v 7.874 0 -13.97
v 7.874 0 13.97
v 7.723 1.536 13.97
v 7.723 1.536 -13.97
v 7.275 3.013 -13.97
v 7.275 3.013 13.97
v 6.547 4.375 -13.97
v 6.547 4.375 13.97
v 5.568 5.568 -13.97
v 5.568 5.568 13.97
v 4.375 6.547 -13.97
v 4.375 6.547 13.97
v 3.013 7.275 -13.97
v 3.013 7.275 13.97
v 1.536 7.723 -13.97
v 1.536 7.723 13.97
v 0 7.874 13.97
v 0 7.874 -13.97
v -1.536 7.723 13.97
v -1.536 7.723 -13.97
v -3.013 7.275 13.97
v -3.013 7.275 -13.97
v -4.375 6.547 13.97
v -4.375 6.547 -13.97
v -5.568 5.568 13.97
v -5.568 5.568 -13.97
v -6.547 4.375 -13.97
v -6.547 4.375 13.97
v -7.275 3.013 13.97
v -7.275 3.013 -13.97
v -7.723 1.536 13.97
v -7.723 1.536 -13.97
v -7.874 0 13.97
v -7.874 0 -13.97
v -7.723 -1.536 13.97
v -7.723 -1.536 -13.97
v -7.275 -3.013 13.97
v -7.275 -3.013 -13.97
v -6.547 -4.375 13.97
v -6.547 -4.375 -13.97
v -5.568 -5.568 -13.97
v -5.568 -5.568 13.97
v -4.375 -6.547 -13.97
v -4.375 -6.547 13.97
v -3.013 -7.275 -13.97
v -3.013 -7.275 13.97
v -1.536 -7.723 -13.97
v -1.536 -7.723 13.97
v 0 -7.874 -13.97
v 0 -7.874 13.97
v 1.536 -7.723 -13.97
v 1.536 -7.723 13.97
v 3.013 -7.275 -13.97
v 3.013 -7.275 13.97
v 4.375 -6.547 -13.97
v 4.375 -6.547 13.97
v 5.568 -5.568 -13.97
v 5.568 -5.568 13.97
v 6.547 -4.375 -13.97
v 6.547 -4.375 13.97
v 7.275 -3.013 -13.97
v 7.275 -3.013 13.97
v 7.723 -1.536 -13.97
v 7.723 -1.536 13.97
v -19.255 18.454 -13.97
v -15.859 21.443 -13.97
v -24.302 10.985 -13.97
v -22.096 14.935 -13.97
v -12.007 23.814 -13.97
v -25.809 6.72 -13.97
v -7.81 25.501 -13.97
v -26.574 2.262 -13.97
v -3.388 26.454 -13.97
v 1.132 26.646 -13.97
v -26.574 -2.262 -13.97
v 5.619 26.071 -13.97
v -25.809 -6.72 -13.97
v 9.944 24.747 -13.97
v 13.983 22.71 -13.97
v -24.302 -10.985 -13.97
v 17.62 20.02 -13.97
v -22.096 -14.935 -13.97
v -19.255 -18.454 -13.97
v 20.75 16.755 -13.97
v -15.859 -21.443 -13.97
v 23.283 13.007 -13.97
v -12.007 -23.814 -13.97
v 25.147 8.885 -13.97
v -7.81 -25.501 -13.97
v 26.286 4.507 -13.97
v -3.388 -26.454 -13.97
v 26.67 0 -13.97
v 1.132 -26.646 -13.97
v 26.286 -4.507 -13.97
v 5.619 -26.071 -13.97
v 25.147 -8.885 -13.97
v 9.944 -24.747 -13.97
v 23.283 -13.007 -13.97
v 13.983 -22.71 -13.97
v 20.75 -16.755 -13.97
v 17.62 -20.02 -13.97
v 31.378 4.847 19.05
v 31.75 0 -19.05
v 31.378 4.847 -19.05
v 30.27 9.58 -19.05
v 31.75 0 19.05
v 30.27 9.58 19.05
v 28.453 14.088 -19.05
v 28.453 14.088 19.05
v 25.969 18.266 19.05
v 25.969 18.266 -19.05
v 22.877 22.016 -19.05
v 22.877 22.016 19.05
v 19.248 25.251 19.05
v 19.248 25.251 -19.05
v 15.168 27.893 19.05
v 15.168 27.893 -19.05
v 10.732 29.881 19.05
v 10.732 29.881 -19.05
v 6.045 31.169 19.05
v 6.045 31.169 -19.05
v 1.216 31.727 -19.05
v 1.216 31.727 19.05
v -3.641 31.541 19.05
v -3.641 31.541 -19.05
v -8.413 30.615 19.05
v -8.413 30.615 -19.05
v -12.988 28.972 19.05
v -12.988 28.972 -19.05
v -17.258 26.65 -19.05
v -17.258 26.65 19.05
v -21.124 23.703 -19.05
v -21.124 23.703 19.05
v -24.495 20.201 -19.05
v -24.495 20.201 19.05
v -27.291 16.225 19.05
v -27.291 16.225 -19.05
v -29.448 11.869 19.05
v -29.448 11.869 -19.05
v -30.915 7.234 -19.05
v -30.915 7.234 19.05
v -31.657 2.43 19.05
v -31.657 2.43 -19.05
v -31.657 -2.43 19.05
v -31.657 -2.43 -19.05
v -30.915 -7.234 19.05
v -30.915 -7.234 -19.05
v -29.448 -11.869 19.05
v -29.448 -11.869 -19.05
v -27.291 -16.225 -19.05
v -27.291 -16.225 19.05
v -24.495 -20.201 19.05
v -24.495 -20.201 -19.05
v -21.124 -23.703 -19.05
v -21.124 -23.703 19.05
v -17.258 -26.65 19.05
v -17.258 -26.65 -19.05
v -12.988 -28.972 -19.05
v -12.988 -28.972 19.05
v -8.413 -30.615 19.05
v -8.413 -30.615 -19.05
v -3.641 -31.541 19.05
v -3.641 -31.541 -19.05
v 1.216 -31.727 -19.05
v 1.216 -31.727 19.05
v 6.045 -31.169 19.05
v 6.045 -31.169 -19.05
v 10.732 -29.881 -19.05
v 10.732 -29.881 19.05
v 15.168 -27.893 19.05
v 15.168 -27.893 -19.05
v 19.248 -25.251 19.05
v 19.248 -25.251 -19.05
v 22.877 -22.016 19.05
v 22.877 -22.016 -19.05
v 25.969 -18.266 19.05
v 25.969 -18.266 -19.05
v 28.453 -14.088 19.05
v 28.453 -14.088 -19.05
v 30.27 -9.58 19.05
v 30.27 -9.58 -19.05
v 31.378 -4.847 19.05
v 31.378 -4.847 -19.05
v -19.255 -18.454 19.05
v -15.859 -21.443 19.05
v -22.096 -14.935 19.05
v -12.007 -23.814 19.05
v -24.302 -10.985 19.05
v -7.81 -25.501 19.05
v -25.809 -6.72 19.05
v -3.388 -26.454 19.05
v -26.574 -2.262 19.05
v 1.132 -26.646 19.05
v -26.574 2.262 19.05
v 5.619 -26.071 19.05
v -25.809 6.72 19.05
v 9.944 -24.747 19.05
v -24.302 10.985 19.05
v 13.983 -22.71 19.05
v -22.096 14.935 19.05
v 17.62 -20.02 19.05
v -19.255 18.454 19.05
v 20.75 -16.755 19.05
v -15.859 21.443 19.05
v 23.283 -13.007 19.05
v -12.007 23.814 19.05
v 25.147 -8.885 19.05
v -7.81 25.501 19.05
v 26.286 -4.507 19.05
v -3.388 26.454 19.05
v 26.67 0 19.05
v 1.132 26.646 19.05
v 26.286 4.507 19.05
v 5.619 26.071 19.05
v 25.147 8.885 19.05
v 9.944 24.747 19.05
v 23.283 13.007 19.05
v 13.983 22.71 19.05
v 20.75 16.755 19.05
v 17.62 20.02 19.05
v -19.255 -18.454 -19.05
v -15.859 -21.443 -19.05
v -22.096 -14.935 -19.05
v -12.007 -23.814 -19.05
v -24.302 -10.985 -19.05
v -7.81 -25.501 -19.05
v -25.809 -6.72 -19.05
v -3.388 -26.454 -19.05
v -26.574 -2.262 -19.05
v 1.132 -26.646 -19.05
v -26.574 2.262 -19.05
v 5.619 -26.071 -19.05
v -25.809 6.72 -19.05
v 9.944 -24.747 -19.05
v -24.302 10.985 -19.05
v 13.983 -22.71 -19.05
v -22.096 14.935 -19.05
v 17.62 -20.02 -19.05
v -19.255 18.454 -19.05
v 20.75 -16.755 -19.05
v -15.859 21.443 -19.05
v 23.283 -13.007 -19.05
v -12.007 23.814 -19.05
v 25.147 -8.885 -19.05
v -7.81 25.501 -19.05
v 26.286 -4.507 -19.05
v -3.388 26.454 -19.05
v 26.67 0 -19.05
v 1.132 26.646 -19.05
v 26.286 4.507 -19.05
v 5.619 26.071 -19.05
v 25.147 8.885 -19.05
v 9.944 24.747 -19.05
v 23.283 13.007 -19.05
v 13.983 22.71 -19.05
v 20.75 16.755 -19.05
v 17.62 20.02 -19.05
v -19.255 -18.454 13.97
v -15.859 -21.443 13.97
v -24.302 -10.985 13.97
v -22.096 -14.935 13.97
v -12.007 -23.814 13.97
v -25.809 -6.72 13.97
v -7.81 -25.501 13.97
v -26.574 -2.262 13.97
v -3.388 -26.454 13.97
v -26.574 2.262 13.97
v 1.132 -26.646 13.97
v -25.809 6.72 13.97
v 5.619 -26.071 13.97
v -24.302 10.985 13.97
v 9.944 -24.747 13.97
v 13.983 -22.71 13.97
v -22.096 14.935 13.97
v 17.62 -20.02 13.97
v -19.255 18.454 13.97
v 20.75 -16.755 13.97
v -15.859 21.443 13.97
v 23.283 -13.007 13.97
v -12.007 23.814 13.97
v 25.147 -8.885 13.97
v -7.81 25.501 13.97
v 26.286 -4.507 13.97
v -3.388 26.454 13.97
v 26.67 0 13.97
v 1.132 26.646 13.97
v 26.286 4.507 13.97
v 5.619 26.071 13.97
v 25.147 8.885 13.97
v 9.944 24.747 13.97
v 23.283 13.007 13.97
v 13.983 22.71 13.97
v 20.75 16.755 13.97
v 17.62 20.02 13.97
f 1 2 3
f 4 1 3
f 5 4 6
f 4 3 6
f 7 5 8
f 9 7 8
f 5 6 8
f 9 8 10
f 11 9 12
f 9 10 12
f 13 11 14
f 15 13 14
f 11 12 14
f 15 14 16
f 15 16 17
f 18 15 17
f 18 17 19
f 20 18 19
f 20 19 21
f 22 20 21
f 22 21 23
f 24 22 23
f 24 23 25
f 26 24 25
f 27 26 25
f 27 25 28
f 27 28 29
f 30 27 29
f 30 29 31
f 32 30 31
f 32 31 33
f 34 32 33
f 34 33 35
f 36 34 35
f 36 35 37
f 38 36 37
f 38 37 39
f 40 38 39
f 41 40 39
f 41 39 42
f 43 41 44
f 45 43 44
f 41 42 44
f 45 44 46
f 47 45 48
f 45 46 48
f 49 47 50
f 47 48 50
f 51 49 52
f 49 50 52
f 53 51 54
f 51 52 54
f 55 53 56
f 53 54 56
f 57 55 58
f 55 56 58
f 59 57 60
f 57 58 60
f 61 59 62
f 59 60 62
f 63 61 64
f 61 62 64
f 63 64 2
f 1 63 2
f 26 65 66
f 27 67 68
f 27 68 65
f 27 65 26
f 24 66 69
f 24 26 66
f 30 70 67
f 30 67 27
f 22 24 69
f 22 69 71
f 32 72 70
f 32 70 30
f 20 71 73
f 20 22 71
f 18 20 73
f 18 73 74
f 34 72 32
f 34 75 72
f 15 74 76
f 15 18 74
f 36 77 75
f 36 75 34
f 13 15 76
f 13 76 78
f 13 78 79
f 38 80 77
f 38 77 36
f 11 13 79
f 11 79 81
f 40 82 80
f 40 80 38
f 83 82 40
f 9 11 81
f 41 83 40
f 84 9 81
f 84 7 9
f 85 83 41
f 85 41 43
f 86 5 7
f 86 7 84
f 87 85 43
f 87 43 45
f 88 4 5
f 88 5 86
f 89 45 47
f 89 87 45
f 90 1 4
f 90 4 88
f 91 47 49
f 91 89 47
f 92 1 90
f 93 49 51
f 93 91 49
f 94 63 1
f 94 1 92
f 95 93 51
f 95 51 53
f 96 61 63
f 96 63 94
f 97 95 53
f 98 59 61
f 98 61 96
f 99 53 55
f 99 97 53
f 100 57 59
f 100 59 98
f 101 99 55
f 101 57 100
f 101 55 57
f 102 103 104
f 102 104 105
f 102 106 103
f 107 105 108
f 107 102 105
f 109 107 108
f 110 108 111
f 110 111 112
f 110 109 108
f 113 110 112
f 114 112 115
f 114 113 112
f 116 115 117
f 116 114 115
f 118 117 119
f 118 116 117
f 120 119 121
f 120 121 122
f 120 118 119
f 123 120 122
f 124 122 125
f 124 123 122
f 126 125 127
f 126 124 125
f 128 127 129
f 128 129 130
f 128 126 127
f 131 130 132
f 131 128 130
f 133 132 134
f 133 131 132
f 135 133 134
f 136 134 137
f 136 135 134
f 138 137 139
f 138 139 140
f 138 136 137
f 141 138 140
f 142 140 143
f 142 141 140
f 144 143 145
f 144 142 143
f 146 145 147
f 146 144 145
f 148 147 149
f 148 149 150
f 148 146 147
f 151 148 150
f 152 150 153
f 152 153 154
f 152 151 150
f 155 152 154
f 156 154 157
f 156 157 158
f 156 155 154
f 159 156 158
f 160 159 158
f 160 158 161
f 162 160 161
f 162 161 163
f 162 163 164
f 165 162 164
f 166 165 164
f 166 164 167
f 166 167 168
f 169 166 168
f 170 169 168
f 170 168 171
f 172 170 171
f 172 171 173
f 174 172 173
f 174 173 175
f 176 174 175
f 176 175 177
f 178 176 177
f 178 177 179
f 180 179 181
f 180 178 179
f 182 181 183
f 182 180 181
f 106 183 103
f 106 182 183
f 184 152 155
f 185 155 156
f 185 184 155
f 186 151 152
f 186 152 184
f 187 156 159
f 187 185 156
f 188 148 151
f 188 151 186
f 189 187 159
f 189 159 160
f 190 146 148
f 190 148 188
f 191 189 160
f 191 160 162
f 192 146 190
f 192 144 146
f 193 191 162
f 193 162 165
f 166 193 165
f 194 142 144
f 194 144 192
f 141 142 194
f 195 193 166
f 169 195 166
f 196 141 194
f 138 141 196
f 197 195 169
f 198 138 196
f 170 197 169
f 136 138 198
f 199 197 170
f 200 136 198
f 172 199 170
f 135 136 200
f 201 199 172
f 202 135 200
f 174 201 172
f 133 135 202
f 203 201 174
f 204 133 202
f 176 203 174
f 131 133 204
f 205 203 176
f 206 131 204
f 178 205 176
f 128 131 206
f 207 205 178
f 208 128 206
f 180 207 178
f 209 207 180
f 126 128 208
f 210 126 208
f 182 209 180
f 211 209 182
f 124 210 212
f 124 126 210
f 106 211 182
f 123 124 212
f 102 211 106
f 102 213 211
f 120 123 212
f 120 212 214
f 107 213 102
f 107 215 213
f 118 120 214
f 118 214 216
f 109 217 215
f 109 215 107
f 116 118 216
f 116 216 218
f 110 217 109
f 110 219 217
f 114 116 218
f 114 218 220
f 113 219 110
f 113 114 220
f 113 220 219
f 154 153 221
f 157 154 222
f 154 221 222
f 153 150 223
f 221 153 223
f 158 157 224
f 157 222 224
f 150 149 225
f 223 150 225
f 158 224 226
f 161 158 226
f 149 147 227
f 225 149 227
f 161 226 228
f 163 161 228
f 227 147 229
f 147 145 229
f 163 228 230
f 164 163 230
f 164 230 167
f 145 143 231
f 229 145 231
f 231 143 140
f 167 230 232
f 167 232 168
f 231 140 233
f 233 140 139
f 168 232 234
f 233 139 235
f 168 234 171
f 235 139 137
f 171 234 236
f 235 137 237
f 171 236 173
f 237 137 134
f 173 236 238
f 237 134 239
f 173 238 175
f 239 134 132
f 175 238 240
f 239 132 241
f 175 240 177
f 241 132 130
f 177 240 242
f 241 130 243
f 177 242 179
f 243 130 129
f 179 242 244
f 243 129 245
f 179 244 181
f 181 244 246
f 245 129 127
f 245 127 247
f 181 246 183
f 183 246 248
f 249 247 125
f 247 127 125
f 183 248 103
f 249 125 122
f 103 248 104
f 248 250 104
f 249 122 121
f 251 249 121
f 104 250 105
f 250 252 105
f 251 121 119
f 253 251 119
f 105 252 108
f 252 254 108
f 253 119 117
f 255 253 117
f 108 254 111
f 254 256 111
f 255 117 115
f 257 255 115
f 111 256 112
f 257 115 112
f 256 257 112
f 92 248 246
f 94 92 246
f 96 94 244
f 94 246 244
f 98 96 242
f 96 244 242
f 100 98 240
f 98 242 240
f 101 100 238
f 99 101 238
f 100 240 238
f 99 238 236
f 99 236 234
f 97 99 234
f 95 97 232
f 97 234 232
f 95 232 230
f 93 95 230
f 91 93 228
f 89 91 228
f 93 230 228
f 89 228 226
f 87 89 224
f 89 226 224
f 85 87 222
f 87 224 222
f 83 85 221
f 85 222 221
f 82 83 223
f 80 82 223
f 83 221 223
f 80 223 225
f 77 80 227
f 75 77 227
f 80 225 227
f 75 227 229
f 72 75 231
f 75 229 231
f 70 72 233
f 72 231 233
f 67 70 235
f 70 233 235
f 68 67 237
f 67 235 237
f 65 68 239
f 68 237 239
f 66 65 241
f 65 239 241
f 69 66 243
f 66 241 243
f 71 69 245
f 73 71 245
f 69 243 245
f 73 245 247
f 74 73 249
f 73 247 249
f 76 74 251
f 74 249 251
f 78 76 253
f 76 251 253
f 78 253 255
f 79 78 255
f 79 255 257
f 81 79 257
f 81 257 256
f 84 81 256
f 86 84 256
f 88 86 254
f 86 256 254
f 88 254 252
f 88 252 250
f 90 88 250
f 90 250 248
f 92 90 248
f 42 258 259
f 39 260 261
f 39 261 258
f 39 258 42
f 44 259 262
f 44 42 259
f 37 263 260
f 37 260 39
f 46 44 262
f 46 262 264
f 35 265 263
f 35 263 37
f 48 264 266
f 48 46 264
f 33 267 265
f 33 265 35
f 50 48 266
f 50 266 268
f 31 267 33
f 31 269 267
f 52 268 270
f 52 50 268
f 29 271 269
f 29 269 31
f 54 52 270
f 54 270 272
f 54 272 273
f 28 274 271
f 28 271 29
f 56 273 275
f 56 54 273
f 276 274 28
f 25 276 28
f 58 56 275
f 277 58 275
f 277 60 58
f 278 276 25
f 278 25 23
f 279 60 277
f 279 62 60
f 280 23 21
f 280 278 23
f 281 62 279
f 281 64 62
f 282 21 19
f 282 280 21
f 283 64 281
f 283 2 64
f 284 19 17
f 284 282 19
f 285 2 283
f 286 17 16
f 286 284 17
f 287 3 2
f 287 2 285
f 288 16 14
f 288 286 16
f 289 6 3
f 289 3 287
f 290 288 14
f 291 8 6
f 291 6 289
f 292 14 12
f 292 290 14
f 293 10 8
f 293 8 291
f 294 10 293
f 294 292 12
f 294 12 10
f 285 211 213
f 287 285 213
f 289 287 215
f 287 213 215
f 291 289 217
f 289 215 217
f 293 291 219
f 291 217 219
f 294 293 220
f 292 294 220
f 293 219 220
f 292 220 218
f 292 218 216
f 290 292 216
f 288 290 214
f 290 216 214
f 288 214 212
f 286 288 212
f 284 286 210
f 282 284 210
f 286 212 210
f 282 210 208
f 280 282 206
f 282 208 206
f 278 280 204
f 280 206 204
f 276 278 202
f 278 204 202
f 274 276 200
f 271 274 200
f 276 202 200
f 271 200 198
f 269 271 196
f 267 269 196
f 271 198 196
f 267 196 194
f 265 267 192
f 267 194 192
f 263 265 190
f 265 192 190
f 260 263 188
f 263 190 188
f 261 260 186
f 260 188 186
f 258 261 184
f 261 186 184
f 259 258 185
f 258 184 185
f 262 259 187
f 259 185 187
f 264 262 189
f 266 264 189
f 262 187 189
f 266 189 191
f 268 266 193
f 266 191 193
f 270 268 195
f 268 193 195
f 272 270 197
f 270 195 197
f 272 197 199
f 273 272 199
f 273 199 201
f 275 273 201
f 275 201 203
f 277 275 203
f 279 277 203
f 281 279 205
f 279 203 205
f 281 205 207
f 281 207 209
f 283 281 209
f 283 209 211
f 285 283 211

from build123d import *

# Parameters (mm, degrees)
F0_R     = 31.75
F1_DEPTH = 19.05
F2_R     = 26.67
F4_DEPTH = 5.08
F3_R     = 26.67
F5_DEPTH = 5.08
F6_R     = 7.874
F7_DEPTH = 50.8


with BuildPart() as f1:
    # F0 (on Top) → F1 (new body, symmetric)
    with BuildSketch(Plane.XY):
        Circle(F0_R)
    extrude(amount=F1_DEPTH, both=True)

    # F2 (on face) → F4 (cut)
    with BuildSketch(Plane.XY.offset(19.05)):
        Circle(F2_R)
    extrude(amount=-F4_DEPTH, mode=Mode.SUBTRACT)

    # F3 (on face) → F5 (cut)
    with BuildSketch(Plane(origin=(0, 0, -19.05), x_dir=(1, 0, 0), z_dir=(0, 0, -1))):
        Circle(F3_R)
    extrude(amount=-F5_DEPTH, mode=Mode.SUBTRACT)

    # F6 (on face) → F7 (cut)
    with BuildSketch(Plane.XY.offset(13.97)):
        Circle(F6_R)
    extrude(amount=-F7_DEPTH, mode=Mode.SUBTRACT)


solid = f1.part
